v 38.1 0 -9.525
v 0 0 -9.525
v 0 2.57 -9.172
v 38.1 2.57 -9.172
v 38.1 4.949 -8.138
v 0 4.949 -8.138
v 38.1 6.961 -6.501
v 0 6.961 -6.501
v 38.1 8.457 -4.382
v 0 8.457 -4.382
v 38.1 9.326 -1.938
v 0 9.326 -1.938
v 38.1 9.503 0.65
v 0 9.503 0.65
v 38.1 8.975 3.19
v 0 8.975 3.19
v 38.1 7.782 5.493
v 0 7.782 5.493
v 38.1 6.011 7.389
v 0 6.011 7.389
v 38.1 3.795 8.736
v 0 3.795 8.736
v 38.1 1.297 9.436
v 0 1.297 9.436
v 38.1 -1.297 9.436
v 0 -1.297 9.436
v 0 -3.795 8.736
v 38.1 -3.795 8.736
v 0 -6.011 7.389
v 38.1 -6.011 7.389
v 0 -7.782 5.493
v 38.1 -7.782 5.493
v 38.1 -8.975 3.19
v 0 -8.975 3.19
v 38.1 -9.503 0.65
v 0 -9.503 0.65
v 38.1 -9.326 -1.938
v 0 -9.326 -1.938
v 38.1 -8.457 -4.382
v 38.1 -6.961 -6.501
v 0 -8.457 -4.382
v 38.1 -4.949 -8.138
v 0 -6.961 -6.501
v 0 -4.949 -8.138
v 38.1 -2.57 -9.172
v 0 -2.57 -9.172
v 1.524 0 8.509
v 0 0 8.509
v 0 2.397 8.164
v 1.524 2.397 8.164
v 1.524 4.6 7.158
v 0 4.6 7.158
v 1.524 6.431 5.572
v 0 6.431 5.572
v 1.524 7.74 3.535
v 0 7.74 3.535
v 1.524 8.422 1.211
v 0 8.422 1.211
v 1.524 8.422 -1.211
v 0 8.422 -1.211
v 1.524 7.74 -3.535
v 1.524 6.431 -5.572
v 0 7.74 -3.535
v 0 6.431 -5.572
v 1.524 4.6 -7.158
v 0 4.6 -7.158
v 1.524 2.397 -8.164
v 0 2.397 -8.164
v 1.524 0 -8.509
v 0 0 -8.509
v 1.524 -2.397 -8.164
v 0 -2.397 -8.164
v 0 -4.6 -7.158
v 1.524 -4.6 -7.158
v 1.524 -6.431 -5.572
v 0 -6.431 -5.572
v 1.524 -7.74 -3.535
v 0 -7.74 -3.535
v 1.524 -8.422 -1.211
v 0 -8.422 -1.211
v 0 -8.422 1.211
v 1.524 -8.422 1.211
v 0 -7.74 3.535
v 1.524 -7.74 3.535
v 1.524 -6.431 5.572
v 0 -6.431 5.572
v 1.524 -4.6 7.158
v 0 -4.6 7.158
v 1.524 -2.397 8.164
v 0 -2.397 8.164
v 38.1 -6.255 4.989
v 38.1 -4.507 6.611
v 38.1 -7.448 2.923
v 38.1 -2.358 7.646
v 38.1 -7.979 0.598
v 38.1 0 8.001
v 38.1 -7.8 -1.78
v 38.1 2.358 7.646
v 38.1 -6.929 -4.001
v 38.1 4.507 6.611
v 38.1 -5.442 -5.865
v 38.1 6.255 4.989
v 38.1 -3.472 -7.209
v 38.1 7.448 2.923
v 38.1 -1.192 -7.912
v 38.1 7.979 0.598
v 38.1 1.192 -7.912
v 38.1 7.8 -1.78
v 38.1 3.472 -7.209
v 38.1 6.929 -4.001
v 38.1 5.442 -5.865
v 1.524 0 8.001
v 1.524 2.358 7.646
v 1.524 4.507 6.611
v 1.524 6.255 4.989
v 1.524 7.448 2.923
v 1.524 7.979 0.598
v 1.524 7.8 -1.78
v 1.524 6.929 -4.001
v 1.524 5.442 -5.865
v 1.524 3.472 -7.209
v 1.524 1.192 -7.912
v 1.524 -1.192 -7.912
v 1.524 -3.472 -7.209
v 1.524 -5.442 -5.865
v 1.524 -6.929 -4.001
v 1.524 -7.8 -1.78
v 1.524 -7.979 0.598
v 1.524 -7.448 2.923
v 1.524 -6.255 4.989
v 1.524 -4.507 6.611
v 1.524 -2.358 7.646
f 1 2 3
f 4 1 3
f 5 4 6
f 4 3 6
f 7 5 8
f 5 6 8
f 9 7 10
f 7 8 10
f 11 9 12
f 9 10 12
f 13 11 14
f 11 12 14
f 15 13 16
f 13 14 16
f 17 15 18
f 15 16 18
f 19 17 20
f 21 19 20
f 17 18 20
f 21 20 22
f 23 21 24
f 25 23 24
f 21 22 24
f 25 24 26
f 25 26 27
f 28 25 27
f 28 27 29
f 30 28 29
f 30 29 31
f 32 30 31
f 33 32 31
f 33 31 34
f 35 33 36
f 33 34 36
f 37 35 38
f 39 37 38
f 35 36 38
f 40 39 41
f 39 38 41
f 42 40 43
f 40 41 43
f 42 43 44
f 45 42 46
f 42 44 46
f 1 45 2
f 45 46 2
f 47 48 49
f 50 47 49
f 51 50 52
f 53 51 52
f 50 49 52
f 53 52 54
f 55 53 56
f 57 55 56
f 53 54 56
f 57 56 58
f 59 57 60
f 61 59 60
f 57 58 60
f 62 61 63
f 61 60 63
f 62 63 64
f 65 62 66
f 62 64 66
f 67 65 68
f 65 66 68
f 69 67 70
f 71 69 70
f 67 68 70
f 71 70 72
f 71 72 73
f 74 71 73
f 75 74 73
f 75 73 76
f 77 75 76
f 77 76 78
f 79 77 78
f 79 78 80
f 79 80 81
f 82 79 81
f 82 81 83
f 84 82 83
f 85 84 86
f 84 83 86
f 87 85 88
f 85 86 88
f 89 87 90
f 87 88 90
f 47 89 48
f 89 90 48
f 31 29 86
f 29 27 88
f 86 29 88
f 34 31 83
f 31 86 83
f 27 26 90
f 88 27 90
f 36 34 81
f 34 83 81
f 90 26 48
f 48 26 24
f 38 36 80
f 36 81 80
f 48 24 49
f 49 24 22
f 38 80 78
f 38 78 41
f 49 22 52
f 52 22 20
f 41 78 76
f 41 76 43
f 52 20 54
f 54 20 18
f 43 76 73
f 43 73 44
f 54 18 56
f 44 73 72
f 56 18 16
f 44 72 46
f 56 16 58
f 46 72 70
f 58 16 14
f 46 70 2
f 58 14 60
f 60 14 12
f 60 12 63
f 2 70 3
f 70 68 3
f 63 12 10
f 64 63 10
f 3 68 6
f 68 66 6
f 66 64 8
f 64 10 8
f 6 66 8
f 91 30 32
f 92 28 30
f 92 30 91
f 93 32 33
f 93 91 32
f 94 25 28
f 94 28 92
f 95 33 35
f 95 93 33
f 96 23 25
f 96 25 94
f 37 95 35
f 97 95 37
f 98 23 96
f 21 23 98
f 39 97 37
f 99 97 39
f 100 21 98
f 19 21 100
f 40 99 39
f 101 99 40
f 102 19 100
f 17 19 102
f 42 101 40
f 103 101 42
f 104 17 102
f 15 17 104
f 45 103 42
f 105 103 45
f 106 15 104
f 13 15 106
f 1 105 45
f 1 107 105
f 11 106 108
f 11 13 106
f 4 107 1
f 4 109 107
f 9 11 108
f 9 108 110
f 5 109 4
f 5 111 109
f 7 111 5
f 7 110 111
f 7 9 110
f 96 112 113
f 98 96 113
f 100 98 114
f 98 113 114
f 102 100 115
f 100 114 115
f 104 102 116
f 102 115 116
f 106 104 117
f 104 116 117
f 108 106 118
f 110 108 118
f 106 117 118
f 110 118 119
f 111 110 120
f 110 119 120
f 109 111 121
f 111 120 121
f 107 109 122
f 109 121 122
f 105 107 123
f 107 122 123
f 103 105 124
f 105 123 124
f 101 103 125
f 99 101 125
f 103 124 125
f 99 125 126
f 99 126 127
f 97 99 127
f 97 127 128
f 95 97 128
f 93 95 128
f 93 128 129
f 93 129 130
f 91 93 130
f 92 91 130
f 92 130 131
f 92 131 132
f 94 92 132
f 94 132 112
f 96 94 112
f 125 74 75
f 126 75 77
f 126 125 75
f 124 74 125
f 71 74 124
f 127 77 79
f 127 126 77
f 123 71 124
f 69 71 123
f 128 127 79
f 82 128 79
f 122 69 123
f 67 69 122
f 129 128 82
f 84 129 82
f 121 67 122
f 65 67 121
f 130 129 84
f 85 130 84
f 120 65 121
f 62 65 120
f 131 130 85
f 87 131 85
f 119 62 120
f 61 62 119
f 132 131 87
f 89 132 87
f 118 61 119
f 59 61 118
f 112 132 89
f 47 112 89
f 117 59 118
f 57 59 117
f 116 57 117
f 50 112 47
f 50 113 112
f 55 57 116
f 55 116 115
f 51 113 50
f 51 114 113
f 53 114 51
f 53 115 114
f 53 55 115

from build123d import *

# Parameters (mm, degrees)
SKETCH1_R           = 9.525
BOSS_EXTRUDE1_DEPTH = 38.1
SKETCH3_R           = 8.509
CUT_EXTRUDE1_DEPTH  = 1.524
SKETCH4_R           = 8.001
CUT_EXTRUDE2_DEPTH  = 37.576


with BuildPart() as part:
    # Sketch1 → Boss-Extrude1 (new body)
    with BuildSketch(Plane(origin=(0, 0, 0), x_dir=(0, 0, -1), z_dir=(1, 0, 0))):
        Circle(SKETCH1_R)
    extrude(amount=BOSS_EXTRUDE1_DEPTH)

    # Sketch3 → Cut-Extrude1 (cut)
    with BuildSketch(Plane.ZY):
        Circle(SKETCH3_R)
    extrude(amount=-CUT_EXTRUDE1_DEPTH, mode=Mode.SUBTRACT)

    # Sketch4 → Cut-Extrude2 (cut, through all)
    with BuildSketch(Plane.ZY.offset(-1.524)):
        Circle(SKETCH4_R)
    extrude(amount=-CUT_EXTRUDE2_DEPTH, mode=Mode.SUBTRACT)


solid = part.part
